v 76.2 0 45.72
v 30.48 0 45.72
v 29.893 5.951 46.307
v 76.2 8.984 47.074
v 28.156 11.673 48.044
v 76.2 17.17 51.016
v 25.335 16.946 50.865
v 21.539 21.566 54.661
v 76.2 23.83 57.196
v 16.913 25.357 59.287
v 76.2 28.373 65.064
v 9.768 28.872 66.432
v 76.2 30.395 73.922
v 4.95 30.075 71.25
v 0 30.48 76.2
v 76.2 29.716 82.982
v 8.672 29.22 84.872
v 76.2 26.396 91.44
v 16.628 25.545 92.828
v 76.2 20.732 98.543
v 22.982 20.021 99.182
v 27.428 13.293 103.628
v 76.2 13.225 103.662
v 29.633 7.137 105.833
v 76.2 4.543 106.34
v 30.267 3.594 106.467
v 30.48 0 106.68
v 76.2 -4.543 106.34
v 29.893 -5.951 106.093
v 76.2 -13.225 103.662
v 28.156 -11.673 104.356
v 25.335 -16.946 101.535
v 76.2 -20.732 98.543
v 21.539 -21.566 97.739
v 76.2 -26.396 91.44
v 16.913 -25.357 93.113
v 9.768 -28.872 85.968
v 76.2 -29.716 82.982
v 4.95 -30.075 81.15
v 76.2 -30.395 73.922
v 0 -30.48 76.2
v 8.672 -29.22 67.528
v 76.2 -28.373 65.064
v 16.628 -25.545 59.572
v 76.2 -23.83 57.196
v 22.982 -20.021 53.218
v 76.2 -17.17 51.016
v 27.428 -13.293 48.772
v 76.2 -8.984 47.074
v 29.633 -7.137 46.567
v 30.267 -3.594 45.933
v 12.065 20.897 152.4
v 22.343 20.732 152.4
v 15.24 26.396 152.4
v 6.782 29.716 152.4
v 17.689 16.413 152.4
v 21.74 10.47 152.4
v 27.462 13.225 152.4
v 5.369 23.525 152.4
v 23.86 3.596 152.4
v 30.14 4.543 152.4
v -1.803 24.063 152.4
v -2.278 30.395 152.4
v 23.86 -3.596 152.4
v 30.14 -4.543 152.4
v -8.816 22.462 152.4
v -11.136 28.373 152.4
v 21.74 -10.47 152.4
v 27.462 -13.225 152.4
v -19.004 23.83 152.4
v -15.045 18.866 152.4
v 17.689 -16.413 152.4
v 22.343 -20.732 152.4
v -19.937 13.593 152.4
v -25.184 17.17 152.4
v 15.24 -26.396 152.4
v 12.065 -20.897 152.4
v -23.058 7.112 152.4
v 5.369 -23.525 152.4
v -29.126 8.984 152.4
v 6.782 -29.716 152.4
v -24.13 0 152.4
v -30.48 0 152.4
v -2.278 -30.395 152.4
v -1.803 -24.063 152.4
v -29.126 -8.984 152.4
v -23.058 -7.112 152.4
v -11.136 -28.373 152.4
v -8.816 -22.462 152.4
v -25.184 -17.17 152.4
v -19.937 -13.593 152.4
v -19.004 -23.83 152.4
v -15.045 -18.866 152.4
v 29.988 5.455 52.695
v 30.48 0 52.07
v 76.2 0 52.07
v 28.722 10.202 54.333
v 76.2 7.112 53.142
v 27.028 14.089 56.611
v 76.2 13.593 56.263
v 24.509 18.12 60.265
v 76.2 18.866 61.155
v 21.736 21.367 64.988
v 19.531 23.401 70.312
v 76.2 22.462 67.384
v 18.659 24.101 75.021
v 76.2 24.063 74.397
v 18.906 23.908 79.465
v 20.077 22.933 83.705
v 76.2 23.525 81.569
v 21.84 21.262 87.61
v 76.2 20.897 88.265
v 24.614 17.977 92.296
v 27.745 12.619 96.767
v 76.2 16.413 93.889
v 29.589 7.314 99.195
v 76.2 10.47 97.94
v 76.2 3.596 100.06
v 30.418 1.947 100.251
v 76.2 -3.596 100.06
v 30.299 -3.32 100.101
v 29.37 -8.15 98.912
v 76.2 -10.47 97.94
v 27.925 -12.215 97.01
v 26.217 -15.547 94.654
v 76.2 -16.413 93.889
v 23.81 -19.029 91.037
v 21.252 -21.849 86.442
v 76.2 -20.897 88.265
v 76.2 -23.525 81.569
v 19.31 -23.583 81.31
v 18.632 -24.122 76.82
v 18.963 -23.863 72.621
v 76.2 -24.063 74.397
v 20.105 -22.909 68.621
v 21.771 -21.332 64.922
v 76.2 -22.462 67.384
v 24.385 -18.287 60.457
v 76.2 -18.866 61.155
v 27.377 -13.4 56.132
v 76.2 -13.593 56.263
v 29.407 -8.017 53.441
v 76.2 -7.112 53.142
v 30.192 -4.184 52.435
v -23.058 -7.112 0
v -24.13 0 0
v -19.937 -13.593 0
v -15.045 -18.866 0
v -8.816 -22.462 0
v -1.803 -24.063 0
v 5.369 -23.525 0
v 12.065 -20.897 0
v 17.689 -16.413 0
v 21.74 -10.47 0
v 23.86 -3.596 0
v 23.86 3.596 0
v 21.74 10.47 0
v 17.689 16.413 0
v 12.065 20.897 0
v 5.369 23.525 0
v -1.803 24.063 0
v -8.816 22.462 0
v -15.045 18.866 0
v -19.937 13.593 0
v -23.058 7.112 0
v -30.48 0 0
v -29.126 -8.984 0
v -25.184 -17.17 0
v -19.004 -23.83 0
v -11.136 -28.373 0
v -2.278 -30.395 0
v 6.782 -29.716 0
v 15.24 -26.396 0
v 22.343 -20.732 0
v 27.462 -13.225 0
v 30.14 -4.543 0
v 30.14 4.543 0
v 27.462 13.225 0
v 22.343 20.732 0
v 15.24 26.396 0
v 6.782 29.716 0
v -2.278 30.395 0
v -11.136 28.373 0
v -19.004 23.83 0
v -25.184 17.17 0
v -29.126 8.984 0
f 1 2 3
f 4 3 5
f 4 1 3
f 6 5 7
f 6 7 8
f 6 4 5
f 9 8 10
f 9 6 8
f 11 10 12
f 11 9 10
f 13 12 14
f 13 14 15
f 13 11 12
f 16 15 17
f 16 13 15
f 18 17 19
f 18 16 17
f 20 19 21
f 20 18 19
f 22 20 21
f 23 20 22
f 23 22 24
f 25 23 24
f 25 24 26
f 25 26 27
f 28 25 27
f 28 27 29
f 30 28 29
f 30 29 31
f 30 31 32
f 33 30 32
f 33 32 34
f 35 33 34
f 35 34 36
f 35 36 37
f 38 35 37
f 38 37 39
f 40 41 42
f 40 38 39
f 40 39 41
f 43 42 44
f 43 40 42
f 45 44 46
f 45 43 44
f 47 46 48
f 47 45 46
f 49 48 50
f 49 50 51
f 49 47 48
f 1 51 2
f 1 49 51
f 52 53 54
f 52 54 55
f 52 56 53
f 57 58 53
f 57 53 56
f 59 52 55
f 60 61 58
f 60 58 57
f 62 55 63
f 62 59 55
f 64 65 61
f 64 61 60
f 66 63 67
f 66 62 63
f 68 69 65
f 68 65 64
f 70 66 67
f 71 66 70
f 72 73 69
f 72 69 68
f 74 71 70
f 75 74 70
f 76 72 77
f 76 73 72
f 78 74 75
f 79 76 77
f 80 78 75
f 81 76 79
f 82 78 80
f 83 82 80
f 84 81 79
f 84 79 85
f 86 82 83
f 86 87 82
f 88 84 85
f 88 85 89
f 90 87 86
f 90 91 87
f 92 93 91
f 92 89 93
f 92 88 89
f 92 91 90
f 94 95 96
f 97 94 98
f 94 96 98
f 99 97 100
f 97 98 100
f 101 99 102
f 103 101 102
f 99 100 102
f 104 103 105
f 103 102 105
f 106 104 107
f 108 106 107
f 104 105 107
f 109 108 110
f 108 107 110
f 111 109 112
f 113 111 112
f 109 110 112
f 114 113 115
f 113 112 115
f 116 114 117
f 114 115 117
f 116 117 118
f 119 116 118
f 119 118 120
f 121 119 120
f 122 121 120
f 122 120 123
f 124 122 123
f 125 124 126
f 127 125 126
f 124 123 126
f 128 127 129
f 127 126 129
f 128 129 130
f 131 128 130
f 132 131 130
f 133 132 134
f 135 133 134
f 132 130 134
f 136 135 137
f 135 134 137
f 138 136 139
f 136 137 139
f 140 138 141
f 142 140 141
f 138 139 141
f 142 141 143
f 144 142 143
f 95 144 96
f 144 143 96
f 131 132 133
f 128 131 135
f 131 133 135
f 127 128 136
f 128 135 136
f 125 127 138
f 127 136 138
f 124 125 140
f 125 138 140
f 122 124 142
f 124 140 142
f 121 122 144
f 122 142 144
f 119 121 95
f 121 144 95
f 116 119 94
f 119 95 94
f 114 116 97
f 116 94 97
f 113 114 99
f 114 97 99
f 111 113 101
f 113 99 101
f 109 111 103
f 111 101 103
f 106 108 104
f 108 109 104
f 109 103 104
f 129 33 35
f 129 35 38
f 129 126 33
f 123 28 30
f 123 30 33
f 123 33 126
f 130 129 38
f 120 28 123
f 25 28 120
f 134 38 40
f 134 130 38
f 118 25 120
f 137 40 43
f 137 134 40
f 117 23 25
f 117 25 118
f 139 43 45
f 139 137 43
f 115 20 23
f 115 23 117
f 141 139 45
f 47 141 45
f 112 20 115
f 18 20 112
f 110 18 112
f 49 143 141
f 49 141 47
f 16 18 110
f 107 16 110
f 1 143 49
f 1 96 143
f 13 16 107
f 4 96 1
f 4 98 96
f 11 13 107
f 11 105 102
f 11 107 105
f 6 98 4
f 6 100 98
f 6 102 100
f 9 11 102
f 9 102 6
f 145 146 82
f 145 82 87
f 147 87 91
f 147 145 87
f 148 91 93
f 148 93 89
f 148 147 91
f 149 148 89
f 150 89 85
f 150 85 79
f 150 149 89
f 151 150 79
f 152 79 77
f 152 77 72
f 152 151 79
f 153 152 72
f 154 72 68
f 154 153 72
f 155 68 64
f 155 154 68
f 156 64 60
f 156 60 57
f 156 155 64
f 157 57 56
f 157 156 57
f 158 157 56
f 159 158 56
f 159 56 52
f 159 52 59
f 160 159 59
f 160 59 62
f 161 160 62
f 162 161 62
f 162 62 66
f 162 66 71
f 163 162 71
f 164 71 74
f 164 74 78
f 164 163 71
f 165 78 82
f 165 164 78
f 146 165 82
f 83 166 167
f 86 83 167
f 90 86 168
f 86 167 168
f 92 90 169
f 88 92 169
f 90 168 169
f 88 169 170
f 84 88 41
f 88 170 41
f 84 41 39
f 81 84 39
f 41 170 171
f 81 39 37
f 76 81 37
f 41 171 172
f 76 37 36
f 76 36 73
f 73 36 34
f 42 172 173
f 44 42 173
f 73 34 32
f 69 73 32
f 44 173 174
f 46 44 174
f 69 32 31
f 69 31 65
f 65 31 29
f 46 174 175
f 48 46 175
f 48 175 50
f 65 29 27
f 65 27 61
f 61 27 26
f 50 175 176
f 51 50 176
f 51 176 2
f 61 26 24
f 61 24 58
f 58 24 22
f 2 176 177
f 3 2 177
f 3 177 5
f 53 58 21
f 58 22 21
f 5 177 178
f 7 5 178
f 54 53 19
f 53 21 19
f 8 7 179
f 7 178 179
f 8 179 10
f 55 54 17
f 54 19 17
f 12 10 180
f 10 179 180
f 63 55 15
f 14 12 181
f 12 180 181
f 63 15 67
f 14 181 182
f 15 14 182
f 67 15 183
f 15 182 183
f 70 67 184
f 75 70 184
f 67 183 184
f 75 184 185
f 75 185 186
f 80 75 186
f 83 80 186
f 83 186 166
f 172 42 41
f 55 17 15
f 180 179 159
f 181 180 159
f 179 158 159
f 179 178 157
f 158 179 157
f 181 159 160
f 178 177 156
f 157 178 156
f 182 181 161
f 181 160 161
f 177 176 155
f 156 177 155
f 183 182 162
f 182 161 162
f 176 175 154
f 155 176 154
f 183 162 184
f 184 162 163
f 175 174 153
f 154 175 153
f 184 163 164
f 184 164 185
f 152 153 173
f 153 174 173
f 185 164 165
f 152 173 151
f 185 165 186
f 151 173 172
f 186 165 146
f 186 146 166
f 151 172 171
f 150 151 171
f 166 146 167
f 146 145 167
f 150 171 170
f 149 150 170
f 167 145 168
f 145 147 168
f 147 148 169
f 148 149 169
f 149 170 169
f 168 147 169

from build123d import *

# Parameters (mm, degrees)
SKETCH1_R                = 30.48
SKETCH1_R_2              = 24.13
BOSS_EXTRUDE1_DEPTH      = 152.4
BOSS_EXTRUDE2_REACH      = 190.508
BOSS_EXTRUDE2_END_RADIUS = 30.48
SKETCH2_R                = 30.48
SKETCH2_R_2              = 24.13


with BuildPart() as part:
    # Sketch1 → Boss-Extrude1 (new body)
    with BuildSketch(Plane.XY):
        with Locations(Location((0, 0, 0), (0, 0, 180))):
            Circle(SKETCH1_R)
        with Locations(Location((0, 0, 0), (0, 0, 180))):
            Circle(SKETCH1_R_2, mode=Mode.SUBTRACT)
    extrude(amount=BOSS_EXTRUDE1_DEPTH)

    # Boss-Extrude2: up to this cylinder (the profile starts outside it)
    boss_extrude2_end = Plane(origin=(0, 0, 105.817895), z_dir=(0, 0, -1)) * Cylinder(BOSS_EXTRUDE2_END_RADIUS, 442.976, mode=Mode.PRIVATE)
    # Sketch2 → Boss-Extrude2 (add, up to the surface)
    with BuildSketch(Plane(origin=(76.2, 0, 0), x_dir=(0, 0, -1), z_dir=(1, 0, 0)), mode=Mode.PRIVATE) as boss_extrude2_sk1:
        with Locations((-76.2, 0)):
            Circle(SKETCH2_R)
        with Locations((-76.2, 0)):
            Circle(SKETCH2_R_2, mode=Mode.SUBTRACT)
    boss_extrude2_tool1 = extrude(boss_extrude2_sk1.sketch, amount=-BOSS_EXTRUDE2_REACH, mode=Mode.PRIVATE) - boss_extrude2_end
    add(boss_extrude2_tool1.solids().sort_by_distance((76.2, 0, 105.817895))[0])


solid = part.part
